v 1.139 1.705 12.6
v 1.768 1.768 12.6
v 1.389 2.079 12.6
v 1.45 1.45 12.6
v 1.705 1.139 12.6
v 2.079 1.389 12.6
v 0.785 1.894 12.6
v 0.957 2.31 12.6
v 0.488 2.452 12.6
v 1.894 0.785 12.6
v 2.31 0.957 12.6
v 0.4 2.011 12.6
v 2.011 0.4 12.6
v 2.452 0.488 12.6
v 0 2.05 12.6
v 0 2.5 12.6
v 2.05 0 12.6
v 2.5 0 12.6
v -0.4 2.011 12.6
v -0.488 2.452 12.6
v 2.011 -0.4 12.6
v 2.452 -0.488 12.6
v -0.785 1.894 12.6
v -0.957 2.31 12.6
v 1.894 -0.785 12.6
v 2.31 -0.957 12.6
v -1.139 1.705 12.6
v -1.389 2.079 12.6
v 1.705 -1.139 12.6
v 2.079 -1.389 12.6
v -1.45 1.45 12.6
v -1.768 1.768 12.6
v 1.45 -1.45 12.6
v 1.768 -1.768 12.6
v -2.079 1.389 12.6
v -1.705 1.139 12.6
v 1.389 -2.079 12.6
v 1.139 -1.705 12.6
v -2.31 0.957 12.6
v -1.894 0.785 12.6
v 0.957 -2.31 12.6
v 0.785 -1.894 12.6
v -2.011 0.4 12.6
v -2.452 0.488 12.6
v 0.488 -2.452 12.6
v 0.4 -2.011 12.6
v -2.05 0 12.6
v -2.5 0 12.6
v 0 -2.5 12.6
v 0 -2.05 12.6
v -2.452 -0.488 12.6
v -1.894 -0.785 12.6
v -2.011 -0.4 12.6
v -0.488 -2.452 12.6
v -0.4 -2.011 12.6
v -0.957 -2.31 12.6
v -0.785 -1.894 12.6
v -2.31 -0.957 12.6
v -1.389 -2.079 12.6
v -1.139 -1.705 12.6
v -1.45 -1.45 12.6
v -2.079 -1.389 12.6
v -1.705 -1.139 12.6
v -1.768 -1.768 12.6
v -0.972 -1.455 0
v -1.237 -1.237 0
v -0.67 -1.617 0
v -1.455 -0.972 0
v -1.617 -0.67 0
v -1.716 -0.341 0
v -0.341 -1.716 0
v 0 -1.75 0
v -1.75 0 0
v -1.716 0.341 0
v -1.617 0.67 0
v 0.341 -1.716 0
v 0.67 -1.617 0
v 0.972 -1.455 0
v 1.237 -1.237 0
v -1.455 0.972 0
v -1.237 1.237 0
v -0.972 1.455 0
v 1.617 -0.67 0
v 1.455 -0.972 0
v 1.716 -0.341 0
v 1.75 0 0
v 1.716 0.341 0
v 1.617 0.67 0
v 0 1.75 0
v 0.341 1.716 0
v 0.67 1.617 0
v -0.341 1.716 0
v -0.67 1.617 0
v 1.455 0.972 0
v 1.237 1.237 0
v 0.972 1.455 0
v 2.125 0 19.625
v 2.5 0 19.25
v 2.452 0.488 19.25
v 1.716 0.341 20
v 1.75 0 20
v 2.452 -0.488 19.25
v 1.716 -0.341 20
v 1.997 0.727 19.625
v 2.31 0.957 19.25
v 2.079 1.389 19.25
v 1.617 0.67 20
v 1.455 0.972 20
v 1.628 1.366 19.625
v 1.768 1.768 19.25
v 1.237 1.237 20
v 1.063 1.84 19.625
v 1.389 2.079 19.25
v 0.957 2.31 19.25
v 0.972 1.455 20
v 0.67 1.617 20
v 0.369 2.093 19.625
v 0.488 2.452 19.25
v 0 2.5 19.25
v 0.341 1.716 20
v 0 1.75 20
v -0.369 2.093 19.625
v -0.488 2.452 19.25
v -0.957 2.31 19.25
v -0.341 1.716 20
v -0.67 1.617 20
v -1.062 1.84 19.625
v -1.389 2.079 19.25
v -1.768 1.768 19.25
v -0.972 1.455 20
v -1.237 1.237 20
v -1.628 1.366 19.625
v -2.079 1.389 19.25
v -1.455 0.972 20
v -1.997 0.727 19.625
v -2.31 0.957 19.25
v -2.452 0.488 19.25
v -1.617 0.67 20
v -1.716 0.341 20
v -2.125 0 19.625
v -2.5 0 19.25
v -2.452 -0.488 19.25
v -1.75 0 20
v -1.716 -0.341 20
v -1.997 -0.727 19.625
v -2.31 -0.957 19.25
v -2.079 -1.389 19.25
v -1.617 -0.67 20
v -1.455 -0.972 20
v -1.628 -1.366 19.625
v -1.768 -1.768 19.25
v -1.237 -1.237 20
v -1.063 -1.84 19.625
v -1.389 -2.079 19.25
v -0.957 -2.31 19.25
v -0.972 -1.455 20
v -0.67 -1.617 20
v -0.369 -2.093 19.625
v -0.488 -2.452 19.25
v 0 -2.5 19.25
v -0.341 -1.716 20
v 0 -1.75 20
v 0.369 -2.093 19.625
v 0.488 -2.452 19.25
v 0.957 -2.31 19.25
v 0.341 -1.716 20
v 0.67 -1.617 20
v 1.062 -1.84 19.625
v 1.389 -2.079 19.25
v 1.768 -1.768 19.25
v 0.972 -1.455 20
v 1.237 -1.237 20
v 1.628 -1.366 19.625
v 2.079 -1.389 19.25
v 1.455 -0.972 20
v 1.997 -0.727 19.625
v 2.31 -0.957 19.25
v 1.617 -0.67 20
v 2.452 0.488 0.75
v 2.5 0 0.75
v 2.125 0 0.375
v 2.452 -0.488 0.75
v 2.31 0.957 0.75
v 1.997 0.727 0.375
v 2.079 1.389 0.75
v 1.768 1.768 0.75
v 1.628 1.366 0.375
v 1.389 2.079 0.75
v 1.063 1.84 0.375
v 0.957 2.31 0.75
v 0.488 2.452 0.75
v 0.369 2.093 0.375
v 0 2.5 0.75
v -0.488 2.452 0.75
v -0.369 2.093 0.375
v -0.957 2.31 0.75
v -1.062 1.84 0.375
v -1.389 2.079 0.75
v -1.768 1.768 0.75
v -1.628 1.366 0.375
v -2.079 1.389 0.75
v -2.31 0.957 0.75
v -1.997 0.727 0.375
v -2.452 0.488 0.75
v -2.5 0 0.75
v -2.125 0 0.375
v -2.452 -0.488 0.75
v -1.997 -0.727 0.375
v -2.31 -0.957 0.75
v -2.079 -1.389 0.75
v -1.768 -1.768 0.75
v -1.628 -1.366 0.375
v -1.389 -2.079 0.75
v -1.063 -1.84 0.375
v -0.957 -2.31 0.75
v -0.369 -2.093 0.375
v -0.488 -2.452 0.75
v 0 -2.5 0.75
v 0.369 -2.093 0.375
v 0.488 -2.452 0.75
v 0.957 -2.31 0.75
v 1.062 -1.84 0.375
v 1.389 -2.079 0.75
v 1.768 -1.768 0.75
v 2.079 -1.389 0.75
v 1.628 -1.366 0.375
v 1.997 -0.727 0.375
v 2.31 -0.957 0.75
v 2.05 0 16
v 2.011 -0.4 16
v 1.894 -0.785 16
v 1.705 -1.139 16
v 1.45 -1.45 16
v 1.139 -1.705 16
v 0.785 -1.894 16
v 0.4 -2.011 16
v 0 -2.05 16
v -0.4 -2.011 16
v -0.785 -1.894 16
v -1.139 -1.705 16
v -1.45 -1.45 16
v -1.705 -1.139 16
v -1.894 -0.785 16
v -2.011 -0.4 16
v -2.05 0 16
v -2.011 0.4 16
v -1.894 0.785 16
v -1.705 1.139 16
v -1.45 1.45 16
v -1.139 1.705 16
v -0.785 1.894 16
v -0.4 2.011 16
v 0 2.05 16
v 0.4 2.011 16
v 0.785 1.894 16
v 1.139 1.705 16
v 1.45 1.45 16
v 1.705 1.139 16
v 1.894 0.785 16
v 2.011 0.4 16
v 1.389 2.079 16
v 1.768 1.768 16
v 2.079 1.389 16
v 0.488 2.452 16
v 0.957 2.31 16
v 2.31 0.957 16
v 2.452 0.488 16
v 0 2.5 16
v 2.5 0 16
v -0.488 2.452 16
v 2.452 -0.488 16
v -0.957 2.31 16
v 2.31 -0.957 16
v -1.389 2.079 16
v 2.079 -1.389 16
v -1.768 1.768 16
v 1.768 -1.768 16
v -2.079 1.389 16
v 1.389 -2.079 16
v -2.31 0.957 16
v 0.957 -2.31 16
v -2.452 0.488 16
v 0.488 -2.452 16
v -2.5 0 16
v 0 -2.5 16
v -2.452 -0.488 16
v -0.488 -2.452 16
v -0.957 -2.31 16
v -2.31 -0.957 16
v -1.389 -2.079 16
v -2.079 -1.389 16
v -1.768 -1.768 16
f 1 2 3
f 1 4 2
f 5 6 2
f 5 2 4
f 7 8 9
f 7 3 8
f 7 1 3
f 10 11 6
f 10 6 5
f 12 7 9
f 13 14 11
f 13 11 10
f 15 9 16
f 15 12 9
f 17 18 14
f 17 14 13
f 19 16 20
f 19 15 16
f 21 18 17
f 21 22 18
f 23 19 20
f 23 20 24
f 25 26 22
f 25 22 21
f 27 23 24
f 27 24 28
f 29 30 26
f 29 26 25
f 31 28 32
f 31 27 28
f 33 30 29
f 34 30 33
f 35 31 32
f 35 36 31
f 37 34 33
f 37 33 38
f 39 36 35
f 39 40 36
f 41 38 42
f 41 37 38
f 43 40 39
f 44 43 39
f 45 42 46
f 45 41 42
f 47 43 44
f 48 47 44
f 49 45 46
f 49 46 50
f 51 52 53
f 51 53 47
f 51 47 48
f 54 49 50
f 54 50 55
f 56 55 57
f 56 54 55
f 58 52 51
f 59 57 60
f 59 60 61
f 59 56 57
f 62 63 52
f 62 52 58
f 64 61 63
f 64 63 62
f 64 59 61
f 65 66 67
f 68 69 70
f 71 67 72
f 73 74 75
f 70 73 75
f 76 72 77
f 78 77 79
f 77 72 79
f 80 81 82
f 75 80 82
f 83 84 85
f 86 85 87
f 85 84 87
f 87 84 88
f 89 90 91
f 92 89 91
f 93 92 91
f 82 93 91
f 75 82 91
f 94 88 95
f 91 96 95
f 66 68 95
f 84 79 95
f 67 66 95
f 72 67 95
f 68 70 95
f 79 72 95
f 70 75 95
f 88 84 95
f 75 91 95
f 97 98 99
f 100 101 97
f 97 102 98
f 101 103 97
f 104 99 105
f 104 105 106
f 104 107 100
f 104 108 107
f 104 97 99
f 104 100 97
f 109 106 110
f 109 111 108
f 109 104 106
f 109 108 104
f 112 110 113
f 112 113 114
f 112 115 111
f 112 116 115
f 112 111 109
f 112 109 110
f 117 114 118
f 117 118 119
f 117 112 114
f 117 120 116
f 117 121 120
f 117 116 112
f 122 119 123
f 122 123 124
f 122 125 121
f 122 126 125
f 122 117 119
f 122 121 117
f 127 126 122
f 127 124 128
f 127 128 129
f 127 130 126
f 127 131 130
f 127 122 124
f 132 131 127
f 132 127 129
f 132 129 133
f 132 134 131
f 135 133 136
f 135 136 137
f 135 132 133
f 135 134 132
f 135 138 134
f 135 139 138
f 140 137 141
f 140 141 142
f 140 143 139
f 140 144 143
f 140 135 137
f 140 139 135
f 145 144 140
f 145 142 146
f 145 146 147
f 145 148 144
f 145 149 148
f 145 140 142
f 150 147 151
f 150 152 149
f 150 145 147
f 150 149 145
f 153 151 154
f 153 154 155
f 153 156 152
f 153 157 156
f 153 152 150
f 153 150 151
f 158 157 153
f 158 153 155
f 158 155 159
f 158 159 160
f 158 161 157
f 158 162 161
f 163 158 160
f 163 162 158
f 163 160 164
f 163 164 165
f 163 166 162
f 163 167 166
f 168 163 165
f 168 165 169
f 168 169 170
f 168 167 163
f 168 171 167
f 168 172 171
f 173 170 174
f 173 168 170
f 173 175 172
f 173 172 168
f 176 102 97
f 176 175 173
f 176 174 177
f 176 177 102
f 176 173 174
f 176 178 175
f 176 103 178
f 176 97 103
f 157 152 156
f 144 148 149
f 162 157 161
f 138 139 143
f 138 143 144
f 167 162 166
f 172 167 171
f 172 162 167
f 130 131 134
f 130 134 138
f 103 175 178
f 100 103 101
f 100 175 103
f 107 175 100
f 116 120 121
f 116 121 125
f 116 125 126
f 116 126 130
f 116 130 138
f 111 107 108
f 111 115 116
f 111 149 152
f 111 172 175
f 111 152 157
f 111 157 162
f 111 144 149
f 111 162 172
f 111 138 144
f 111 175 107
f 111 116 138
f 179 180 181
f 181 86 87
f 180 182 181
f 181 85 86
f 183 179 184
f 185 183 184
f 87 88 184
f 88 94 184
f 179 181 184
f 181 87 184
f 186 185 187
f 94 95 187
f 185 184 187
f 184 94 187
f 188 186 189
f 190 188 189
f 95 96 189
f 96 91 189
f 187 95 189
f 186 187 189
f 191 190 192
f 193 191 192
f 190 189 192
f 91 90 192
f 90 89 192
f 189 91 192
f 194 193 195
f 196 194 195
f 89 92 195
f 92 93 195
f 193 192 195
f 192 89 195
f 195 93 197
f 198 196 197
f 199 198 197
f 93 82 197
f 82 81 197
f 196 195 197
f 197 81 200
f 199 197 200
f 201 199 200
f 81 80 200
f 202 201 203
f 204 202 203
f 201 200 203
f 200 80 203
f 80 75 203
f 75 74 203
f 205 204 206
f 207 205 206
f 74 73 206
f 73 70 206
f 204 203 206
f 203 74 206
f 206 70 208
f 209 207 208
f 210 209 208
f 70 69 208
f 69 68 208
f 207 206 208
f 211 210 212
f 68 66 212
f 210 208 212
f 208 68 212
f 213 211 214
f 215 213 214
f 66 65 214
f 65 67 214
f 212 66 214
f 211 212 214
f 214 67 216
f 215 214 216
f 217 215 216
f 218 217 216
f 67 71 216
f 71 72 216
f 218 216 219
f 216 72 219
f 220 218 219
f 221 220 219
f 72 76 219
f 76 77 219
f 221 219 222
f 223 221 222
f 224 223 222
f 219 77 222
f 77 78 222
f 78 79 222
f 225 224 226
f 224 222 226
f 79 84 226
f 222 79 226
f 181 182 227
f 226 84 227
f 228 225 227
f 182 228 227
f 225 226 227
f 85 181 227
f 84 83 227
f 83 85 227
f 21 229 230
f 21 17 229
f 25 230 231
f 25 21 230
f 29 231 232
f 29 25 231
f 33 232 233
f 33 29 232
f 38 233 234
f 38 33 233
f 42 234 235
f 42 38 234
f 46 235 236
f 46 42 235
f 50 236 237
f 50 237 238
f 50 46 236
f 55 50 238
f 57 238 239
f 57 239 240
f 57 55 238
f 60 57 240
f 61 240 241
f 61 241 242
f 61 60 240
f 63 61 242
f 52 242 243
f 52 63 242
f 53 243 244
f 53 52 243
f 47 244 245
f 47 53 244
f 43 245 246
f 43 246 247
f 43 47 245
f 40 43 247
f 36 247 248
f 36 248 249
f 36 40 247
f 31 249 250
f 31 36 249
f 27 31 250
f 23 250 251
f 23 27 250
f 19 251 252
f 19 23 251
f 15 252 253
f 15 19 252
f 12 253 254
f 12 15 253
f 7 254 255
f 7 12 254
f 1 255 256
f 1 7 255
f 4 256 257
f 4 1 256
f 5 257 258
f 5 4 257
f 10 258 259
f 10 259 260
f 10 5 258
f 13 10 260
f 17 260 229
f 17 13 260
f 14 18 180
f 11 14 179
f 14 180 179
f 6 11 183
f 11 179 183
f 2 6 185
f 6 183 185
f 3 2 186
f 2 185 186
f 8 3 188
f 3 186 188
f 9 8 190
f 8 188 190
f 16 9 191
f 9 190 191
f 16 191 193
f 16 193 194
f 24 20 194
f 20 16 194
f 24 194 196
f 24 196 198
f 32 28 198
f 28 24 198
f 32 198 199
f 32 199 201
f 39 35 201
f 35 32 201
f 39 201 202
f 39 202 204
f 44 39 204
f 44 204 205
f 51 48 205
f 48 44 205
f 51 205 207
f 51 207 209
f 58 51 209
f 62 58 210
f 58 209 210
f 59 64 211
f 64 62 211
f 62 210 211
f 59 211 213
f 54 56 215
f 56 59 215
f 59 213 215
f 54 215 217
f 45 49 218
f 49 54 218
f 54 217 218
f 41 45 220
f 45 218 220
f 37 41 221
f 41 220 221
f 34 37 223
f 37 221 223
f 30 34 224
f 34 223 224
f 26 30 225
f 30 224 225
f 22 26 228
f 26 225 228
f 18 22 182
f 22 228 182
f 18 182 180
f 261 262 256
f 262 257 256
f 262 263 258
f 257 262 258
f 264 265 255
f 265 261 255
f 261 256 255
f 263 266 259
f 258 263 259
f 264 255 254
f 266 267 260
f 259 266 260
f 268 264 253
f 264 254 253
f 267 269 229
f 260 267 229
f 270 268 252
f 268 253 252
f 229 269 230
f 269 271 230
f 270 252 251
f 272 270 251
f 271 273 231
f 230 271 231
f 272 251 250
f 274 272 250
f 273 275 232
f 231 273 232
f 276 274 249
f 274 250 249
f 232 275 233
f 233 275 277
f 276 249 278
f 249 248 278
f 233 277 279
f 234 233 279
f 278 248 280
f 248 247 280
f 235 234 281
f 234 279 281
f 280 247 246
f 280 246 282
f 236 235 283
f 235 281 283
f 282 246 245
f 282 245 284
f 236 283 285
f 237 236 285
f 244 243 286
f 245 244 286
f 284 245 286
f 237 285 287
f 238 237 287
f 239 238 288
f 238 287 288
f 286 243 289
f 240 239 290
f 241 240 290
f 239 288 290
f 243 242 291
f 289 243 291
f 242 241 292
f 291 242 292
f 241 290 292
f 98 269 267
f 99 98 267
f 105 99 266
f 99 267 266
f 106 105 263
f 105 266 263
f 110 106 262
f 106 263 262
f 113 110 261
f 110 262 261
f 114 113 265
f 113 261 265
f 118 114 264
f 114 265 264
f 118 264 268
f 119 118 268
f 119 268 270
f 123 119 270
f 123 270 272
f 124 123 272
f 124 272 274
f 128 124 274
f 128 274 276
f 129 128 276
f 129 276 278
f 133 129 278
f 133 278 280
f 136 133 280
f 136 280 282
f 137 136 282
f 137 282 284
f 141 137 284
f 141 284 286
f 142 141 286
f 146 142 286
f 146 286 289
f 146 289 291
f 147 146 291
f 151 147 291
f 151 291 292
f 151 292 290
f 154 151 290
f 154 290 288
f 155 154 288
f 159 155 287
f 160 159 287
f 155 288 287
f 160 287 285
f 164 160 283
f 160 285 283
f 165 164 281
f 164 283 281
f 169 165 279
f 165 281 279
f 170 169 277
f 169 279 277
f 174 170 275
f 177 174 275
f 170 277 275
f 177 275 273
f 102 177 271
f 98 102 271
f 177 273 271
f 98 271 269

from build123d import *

# Parameters (mm, degrees)
SKETCH_1_R      = 2.5
EXTRUDE_1_DEPTH = 20
CHAMFER_1_SIZE  = 0.75
SKETCH_2_W      = 3.4
SKETCH_2_H      = 0.45


with BuildPart() as part:
    # Эскиз1 → Бобышка-Вытянуть1 (new body)
    with BuildSketch(Plane.XY):
        Circle(SKETCH_1_R)
    extrude(amount=EXTRUDE_1_DEPTH)

    # Фаска1
    chamfer_1_edges = [part.edges().sort_by_distance(p)[0] for p in [
        (-2.5, 0, 20),
        (-2.5, 0, 0),
    ]]
    chamfer(chamfer_1_edges, length=CHAMFER_1_SIZE)

    # Эскиз2 → Вырез-Повернуть1 (revolve, cut)
    with BuildSketch(Plane(origin=(0, 0, 0), x_dir=(0, 0, -1), z_dir=(1, 0, 0))):
        with Locations((-14.3, 2.275)):
            Rectangle(SKETCH_2_W, SKETCH_2_H)
    revolve(axis=Axis((0, 0, 20), (0, 0, -1)), mode=Mode.SUBTRACT)


solid = part.part
